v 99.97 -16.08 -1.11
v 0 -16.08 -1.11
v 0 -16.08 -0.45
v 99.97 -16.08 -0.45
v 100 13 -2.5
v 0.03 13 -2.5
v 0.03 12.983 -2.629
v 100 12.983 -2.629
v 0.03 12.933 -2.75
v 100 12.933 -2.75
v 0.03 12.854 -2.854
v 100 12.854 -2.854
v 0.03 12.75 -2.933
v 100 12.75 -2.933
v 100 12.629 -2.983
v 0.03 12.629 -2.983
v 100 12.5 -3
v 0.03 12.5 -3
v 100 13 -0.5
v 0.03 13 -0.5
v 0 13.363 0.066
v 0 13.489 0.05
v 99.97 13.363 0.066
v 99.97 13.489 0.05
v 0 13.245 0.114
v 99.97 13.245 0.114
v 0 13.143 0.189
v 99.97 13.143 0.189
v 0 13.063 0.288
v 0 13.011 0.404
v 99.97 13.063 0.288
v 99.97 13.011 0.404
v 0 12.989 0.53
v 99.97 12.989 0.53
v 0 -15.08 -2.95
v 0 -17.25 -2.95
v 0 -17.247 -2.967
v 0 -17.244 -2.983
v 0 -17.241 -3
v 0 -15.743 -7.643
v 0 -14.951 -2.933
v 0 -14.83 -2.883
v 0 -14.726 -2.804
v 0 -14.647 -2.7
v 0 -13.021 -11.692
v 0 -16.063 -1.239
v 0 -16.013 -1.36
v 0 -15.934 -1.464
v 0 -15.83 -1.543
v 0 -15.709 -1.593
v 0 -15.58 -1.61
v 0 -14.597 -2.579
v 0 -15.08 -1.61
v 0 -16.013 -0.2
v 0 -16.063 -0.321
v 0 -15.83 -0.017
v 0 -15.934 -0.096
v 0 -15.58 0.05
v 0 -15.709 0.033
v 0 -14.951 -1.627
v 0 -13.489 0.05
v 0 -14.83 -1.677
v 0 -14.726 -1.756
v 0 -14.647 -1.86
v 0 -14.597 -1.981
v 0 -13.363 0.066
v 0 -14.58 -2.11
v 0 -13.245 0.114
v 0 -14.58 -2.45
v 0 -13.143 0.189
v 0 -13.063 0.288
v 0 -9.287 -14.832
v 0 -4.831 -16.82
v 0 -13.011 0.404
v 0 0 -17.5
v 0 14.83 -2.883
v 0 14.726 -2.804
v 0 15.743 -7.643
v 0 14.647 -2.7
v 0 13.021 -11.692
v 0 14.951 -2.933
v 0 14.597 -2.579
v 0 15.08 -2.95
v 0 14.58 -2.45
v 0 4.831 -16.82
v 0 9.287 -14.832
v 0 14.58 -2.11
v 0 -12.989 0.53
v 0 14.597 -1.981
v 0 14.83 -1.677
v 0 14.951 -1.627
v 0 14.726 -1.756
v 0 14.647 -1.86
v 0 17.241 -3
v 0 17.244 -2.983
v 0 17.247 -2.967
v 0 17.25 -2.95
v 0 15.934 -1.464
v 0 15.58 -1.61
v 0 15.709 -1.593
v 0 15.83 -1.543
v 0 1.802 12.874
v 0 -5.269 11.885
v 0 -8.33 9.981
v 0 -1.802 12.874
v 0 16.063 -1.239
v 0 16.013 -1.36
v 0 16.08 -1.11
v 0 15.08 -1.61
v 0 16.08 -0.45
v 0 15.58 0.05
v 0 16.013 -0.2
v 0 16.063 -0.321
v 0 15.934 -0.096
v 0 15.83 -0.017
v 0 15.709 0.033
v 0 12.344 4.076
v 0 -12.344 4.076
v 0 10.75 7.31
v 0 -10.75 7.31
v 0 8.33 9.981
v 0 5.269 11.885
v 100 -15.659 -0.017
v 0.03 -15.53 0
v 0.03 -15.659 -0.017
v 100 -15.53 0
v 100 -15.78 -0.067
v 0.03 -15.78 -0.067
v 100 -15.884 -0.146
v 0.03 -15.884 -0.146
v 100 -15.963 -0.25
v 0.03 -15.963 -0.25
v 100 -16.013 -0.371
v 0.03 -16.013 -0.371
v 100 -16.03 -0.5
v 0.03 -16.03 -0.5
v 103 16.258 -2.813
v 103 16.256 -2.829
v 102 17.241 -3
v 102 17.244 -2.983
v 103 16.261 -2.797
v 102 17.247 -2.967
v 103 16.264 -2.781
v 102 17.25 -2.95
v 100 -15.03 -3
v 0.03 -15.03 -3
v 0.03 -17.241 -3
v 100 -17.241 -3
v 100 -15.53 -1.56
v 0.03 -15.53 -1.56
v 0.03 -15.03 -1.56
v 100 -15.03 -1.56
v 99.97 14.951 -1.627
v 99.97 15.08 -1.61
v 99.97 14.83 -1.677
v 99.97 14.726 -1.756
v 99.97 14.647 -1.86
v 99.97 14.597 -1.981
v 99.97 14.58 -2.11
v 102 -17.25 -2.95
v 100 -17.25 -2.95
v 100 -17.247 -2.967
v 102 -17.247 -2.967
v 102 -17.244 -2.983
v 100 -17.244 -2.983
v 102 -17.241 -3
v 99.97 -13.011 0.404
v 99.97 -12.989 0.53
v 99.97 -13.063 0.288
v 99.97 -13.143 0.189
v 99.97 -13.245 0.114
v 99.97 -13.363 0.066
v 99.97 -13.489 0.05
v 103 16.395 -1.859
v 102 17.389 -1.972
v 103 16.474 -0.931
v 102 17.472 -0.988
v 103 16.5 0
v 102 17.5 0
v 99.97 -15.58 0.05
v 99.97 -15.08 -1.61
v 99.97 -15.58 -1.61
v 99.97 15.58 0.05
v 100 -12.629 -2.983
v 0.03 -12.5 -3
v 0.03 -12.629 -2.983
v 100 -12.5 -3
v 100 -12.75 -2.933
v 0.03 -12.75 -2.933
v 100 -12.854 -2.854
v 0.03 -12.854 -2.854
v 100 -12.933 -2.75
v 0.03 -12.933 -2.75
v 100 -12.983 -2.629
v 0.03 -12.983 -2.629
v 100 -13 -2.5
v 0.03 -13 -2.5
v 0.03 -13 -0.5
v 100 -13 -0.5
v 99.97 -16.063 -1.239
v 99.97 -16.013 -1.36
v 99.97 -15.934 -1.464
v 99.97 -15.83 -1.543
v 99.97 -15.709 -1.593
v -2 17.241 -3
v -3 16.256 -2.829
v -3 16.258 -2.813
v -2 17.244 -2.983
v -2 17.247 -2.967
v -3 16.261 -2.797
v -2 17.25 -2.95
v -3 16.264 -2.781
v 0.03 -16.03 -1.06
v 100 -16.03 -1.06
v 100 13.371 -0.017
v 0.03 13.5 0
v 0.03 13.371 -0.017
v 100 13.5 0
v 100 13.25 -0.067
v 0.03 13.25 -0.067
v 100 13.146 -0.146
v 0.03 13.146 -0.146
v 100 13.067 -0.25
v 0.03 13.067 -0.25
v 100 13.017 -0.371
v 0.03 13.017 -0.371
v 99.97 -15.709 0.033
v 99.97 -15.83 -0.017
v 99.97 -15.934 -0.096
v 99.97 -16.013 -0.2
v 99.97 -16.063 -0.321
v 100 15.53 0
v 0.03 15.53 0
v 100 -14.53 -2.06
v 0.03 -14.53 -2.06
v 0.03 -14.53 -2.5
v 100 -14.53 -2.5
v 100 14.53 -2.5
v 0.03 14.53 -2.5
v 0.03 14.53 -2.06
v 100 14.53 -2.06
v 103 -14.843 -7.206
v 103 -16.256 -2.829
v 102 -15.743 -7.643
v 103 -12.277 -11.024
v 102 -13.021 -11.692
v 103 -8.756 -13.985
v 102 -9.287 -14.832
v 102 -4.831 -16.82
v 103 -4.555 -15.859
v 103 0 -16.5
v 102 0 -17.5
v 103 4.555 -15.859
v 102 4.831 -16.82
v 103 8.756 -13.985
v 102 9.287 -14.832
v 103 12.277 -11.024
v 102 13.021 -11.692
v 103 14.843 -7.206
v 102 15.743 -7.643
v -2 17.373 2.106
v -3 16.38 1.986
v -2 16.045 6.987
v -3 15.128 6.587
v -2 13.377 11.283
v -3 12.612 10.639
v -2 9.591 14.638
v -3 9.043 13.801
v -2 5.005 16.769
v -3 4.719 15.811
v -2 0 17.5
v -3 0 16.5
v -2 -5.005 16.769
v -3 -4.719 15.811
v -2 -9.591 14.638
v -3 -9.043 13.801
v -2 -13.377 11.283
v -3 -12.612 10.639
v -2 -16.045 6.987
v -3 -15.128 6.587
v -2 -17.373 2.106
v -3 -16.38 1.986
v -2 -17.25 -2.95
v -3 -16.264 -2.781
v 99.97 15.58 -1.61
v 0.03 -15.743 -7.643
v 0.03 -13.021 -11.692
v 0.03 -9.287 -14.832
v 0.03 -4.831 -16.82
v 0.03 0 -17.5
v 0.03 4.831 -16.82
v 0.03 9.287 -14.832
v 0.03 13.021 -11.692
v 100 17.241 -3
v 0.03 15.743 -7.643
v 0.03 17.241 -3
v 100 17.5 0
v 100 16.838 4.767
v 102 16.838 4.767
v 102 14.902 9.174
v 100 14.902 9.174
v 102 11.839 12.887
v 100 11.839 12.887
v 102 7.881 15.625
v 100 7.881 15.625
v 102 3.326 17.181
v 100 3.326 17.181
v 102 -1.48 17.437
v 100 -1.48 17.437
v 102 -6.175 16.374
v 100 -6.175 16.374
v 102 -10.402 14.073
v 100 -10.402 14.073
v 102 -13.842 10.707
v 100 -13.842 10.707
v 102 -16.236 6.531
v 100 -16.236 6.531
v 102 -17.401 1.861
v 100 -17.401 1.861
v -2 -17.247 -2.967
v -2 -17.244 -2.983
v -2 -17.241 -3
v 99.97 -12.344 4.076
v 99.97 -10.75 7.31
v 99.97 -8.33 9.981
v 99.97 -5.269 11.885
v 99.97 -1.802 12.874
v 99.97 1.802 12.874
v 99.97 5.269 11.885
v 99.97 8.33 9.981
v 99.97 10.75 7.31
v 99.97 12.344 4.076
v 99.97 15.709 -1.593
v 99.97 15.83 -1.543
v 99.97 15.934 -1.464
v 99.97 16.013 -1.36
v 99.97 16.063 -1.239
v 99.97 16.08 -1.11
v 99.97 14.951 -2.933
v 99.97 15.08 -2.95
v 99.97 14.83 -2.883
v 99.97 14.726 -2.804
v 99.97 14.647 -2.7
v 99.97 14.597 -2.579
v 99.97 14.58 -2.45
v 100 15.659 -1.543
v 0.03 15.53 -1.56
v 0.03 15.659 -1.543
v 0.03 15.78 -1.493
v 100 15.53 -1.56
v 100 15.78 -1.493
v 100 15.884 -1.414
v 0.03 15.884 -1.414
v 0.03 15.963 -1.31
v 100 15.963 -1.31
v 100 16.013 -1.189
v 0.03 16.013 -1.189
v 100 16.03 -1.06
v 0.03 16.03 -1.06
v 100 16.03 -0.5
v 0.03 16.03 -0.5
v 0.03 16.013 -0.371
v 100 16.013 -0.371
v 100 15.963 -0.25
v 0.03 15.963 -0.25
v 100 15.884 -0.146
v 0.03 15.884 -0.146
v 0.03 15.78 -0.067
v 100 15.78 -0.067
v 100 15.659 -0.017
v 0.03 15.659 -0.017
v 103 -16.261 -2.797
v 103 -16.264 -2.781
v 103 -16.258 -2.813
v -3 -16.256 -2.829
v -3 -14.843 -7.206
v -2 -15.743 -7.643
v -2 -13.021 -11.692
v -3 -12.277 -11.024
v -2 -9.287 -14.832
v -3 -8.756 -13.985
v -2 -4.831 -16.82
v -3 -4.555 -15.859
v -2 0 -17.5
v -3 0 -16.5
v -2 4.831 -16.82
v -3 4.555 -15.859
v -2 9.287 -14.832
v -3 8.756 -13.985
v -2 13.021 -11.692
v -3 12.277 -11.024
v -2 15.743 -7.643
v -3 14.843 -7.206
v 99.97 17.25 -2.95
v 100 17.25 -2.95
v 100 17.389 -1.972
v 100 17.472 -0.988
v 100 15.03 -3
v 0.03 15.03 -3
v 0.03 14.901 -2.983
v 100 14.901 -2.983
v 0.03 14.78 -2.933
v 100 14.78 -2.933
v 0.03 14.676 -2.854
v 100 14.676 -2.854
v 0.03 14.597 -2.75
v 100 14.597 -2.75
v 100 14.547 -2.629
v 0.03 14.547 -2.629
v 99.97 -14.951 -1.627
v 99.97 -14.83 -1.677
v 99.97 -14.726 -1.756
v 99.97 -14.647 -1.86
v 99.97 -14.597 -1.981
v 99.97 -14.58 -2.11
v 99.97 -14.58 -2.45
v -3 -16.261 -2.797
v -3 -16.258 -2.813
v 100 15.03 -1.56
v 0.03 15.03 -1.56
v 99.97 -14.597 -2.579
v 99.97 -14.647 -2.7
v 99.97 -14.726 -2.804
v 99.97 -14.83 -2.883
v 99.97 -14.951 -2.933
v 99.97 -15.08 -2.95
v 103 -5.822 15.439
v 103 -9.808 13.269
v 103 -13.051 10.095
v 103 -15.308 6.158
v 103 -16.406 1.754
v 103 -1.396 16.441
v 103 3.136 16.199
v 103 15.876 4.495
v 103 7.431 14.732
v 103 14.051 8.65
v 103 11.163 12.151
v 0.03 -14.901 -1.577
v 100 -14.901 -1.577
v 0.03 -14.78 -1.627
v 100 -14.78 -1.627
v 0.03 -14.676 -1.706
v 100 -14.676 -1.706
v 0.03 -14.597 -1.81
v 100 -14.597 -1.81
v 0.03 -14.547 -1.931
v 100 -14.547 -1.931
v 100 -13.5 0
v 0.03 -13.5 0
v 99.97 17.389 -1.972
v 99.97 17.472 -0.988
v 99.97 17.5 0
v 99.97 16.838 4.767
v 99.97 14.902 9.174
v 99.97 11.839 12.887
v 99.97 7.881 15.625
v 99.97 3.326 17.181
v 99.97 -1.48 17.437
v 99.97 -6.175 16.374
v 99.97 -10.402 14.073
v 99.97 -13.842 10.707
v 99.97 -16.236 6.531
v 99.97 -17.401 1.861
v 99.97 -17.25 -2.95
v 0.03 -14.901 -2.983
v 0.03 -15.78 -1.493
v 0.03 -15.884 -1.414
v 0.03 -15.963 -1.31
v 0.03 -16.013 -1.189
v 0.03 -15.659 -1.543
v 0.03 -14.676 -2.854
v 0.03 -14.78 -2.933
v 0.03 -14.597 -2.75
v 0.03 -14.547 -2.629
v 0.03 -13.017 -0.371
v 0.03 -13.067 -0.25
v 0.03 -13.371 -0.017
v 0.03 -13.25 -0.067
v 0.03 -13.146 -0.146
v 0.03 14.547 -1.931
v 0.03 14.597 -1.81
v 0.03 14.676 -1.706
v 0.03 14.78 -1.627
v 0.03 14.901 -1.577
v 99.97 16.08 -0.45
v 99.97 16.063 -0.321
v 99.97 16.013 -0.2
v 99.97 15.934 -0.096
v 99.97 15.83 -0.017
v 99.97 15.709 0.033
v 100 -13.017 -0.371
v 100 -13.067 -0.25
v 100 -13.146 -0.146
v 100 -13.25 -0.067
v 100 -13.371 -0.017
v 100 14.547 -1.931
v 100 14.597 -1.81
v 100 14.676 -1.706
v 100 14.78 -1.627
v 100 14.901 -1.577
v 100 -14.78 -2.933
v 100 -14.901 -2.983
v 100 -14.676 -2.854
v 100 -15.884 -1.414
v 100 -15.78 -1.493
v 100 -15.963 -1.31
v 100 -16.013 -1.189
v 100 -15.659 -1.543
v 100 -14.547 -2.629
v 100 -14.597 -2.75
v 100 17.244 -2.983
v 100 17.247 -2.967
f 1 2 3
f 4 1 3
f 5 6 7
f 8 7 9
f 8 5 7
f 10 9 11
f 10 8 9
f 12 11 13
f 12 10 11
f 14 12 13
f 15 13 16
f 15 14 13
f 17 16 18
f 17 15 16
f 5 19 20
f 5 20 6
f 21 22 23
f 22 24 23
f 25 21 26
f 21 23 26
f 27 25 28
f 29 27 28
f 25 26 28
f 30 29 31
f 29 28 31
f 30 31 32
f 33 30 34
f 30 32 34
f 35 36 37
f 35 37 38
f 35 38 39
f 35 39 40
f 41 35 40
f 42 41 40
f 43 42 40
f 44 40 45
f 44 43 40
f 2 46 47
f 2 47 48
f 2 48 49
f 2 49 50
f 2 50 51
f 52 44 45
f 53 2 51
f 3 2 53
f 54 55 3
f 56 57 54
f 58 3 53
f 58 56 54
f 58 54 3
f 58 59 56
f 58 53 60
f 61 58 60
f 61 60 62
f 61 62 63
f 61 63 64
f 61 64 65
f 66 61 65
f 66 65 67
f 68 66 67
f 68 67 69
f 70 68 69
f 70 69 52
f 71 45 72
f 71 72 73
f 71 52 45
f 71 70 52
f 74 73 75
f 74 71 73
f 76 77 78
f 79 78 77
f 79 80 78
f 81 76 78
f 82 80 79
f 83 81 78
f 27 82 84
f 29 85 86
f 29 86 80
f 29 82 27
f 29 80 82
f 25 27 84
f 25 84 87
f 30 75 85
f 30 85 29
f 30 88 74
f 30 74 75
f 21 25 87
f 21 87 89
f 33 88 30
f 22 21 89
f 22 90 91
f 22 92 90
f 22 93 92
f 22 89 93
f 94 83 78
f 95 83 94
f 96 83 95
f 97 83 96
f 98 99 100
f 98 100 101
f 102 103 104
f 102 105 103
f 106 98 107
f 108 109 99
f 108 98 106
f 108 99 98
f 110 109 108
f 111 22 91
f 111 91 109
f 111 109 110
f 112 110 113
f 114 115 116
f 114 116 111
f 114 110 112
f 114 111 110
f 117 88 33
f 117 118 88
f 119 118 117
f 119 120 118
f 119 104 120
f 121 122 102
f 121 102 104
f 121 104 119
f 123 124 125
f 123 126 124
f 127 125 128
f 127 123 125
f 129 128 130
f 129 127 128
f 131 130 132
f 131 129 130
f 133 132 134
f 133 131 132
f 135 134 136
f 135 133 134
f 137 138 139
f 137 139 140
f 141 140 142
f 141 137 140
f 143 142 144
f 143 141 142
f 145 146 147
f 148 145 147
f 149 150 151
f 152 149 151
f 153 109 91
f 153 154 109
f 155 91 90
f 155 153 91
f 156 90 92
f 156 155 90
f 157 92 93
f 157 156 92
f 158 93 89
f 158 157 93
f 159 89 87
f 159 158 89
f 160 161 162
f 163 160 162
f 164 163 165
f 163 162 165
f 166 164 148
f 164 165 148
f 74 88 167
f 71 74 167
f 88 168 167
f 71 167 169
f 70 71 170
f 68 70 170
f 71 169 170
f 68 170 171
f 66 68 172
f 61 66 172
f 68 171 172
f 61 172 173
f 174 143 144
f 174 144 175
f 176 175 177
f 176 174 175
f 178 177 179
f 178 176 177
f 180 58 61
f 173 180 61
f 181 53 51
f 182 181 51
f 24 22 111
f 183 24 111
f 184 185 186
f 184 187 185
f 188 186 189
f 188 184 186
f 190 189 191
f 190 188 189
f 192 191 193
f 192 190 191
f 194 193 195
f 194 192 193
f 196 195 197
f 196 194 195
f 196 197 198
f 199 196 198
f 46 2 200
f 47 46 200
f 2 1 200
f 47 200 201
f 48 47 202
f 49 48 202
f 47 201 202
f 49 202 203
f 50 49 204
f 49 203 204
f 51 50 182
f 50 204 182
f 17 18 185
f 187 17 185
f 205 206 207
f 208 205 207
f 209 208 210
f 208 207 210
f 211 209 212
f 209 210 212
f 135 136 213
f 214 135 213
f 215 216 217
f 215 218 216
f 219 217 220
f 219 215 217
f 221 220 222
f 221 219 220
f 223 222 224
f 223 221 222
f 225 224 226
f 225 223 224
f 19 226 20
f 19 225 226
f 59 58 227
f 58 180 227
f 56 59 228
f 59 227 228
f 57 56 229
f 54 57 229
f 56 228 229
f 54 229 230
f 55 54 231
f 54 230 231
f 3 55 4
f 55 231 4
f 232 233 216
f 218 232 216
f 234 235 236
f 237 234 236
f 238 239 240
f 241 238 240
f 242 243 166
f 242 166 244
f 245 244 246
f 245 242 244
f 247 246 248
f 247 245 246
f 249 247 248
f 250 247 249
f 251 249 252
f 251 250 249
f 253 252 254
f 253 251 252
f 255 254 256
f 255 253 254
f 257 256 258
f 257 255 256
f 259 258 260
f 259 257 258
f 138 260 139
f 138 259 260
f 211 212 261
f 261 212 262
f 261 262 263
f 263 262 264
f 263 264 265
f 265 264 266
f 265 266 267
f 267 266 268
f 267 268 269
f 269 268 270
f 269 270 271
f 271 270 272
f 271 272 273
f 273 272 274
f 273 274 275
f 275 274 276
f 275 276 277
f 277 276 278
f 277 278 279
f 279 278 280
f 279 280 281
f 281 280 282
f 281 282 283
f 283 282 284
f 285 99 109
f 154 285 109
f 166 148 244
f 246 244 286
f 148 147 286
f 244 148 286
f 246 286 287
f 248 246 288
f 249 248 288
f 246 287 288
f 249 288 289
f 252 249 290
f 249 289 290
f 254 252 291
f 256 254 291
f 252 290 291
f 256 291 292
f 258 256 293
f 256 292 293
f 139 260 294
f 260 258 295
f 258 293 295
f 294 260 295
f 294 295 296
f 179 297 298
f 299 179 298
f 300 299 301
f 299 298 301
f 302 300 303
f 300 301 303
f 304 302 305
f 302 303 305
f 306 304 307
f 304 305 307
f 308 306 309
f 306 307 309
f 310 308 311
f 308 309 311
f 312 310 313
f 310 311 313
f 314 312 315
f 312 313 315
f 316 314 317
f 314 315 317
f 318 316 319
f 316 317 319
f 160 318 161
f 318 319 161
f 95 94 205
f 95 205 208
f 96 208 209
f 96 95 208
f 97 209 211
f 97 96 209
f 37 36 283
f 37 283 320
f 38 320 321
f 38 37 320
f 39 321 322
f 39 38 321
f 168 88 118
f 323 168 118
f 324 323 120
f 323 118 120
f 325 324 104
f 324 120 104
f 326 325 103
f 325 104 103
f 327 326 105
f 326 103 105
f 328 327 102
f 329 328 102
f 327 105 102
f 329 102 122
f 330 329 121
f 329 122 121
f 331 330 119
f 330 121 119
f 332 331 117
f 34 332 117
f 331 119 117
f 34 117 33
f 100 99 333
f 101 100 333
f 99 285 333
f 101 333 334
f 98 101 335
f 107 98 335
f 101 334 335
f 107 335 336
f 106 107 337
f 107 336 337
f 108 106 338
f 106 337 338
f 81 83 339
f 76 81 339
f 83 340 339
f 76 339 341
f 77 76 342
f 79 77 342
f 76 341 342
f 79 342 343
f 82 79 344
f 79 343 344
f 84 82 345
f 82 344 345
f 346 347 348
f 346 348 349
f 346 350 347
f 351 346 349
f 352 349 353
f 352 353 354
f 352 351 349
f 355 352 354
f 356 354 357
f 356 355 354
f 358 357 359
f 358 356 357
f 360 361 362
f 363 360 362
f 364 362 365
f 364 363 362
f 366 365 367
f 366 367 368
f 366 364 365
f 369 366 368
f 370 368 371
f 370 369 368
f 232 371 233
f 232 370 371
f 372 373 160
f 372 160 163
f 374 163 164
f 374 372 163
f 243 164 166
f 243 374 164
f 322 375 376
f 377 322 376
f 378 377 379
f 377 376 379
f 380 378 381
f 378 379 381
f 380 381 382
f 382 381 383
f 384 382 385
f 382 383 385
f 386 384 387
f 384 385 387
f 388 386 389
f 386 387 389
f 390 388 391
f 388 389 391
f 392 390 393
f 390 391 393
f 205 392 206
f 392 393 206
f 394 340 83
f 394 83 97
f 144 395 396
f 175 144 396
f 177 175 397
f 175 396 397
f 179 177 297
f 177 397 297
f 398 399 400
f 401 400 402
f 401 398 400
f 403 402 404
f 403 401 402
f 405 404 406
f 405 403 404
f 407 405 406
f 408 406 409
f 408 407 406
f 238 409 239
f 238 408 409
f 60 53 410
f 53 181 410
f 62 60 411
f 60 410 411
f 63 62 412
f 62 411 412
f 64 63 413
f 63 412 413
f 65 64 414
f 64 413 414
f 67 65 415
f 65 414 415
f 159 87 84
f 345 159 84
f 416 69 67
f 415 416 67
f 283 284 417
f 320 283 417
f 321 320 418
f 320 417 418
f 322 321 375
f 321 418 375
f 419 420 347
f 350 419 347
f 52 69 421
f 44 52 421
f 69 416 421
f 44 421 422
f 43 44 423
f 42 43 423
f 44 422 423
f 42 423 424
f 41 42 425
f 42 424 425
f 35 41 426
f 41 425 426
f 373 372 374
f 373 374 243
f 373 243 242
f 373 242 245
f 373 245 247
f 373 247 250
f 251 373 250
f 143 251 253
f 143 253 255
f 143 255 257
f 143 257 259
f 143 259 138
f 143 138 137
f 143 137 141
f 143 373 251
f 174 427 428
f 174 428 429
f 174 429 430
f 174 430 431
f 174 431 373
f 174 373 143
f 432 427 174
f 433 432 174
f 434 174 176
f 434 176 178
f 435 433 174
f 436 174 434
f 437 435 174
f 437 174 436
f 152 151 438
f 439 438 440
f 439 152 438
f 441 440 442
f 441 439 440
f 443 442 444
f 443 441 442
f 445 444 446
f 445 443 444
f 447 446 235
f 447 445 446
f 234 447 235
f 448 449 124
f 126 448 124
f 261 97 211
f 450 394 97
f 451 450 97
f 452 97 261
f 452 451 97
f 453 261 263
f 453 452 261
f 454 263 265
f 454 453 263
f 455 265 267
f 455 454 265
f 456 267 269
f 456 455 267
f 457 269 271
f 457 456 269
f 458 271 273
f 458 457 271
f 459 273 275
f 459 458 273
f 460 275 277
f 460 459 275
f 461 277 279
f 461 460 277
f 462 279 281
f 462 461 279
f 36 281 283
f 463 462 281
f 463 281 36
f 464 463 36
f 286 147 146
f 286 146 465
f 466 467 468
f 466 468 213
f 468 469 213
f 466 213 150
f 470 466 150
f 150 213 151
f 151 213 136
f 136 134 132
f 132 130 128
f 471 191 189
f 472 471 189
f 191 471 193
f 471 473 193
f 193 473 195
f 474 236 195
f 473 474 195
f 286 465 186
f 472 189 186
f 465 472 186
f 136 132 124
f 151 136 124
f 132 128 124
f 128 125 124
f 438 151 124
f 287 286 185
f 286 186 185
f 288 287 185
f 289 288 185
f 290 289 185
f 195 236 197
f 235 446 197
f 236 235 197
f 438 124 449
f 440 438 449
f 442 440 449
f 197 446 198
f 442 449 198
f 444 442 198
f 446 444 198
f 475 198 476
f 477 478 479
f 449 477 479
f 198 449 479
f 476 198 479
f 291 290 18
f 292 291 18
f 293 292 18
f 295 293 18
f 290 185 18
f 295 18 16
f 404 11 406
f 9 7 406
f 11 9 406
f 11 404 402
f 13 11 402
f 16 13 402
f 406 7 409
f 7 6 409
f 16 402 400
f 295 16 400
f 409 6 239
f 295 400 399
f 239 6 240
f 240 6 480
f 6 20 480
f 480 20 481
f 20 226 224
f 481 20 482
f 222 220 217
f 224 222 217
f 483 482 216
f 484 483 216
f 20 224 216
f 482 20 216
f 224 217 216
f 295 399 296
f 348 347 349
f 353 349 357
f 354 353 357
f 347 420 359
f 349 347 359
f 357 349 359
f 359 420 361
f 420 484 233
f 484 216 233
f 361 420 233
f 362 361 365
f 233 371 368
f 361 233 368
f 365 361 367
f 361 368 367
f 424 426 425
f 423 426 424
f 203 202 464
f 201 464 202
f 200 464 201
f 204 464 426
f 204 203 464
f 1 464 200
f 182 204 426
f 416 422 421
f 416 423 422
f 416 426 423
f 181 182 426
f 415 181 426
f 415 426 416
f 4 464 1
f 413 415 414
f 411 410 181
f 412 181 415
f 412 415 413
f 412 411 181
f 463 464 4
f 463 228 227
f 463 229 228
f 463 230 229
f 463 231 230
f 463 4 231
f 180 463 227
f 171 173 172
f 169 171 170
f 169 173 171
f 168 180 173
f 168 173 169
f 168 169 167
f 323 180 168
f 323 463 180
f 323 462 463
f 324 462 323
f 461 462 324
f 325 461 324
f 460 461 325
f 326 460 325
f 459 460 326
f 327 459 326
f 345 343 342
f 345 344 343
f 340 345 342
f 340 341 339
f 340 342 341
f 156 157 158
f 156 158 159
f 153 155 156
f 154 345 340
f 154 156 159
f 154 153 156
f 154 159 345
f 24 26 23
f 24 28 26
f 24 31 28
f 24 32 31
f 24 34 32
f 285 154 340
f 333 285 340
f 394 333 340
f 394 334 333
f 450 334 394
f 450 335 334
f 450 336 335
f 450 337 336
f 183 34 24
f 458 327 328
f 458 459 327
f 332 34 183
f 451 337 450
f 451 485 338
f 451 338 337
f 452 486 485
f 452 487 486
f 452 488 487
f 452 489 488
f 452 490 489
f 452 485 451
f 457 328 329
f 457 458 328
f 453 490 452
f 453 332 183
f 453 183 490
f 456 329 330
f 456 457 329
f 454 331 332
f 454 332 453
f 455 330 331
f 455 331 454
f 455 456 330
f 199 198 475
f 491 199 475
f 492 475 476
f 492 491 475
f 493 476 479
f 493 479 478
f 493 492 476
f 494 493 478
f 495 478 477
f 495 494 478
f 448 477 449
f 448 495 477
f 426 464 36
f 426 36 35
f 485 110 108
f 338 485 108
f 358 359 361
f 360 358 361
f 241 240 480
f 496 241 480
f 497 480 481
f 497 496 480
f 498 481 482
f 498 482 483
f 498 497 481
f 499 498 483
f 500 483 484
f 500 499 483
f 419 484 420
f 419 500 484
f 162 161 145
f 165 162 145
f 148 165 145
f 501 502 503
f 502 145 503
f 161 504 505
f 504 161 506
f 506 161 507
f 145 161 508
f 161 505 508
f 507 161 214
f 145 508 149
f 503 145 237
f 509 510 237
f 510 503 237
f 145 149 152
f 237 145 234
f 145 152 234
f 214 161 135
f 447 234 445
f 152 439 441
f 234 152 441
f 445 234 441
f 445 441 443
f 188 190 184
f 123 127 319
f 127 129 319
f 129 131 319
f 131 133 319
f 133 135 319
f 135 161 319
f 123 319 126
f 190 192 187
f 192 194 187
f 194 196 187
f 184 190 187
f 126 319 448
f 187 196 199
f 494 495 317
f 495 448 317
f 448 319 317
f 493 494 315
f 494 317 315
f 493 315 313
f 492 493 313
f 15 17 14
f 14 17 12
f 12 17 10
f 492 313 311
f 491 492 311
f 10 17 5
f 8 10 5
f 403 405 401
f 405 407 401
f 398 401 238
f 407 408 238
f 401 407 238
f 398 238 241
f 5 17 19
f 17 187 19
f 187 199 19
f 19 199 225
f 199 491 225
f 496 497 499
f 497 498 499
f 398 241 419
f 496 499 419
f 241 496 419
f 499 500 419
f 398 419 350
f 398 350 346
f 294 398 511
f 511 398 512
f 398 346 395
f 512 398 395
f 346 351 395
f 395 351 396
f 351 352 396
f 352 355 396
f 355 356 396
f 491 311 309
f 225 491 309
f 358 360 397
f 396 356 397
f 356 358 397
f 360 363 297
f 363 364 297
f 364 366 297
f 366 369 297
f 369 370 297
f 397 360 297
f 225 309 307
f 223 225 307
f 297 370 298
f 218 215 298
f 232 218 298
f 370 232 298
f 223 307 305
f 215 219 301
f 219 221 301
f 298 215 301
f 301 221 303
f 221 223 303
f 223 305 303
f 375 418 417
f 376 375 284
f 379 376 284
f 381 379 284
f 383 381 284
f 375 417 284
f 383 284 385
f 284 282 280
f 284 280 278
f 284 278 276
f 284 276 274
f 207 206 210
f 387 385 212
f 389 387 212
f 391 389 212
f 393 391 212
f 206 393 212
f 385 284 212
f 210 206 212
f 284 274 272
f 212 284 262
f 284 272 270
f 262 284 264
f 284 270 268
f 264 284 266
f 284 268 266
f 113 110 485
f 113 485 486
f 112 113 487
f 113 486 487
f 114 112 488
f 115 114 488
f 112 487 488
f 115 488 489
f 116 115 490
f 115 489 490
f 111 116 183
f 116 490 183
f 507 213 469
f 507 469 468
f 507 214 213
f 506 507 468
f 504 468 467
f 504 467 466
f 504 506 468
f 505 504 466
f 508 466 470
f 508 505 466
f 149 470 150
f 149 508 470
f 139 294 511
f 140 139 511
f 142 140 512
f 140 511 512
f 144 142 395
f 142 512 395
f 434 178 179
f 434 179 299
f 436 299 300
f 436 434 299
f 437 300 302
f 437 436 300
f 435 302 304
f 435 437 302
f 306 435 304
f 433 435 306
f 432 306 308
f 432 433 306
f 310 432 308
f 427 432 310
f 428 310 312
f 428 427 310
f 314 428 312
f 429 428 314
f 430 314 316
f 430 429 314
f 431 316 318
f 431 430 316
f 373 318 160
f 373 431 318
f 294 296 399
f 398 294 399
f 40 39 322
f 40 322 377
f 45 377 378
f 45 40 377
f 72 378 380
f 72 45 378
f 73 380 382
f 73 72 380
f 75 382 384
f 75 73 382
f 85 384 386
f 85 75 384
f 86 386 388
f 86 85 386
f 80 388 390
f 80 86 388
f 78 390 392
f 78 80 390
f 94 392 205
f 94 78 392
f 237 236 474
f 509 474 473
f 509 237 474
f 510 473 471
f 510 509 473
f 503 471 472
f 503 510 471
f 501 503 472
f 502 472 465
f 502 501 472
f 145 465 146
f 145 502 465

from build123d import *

# Parameters (mm, degrees)
F1_DEPTH  = 99.97
F2_DEPTH  = 3
F3_START  = 0.03
F3_DEPTH  = 99.97
F4_START  = 100
F4_DEPTH  = 3
F5_SIZE   = 1
F5_2_SIZE = 1
F6_R      = 0.5
F6_2_R    = 0.5


with BuildPart() as f1:
    # F0 (on Right) → F1 (new body)
    with BuildSketch(Plane.YZ):
        with BuildLine():
            ThreePointArc((17.2495652119, -2.95), (17.4372789048, -1.4803055076), (17.5, 0))
            ThreePointArc((17.5, 0), (-1.4803055076, 17.4372789048), (-17.2495652119, -2.95))
            Line((-17.2495652119, -2.95), (-14.5799998846, -2.95))
            Line((-14.5799998846, -2.95), (-14.5799998846, -1.6099997692))
            Line((-14.5799998846, -1.6099997692), (-16.0799998846, -1.6099997692))
            Line((-16.0799998846, -1.6099997692), (-16.0799998846, 0.05))
            Line((-16.0799998846, 0.05), (-12.9999038458, 0.05))
            ThreePointArc((-12.9999038458, 0.05), (0, 13), (12.9999038458, 0.05))
            Line((12.9999038458, 0.05), (16.0799998846, 0.05))
            Line((16.0799998846, 0.05), (16.0799998846, -1.6099997692))
            Line((16.0799998846, -1.6099997692), (14.5799998846, -1.6099997692))
            Line((14.5799998846, -1.6099997692), (14.5799998846, -2.95))
            Line((14.5799998846, -2.95), (17.2495652119, -2.95))
        make_face()
    extrude(amount=F1_DEPTH)

    # F0 (on Right) → F2 (join)
    with BuildSketch(Plane.YZ):
        with BuildLine():
            ThreePointArc((17.2495652119, -2.95), (17.4372789048, -1.4803055076), (17.5, 0))
            ThreePointArc((17.5, 0), (-1.4803055076, 17.4372789048), (-17.2495652119, -2.95))
            Line((-17.2495652119, -2.95), (-14.5799998846, -2.95))
            Line((-14.5799998846, -2.95), (-14.5799998846, -1.6099997692))
            Line((-14.5799998846, -1.6099997692), (-16.0799998846, -1.6099997692))
            Line((-16.0799998846, -1.6099997692), (-16.0799998846, 0.05))
            Line((-16.0799998846, 0.05), (-12.9999038458, 0.05))
            ThreePointArc((-12.9999038458, 0.05), (0, 13), (12.9999038458, 0.05))
            Line((12.9999038458, 0.05), (16.0799998846, 0.05))
            Line((16.0799998846, 0.05), (16.0799998846, -1.6099997692))
            Line((16.0799998846, -1.6099997692), (14.5799998846, -1.6099997692))
            Line((14.5799998846, -1.6099997692), (14.5799998846, -2.95))
            Line((14.5799998846, -2.95), (17.2495652119, -2.95))
        make_face()
        with BuildLine():
            Line((-14.5799998846, -2.95), (-17.2495652119, -2.95))
            ThreePointArc((-17.2495652119, -2.95), (-17.2452705517, -2.9750031261), (-17.2409396496, -3))
            Line((-17.2409396496, -3), (-14.5299998846, -3))
            Line((-14.5299998846, -3), (-14.5299998846, -1.5599997692))
            Line((-14.5299998846, -1.5599997692), (-16.0299998846, -1.5599997692))
            Line((-16.0299998846, -1.5599997692), (-16.0299998846, 0))
            Line((-16.0299998846, 0), (-13, 0))
            ThreePointArc((-13, 0), (-12.9999759614, 0.0250000462), (-12.9999038458, 0.05))
            Line((-12.9999038458, 0.05), (-16.0799998846, 0.05))
            Line((-16.0799998846, 0.05), (-16.0799998846, -1.6099997692))
            Line((-16.0799998846, -1.6099997692), (-14.5799998846, -1.6099997692))
            Line((-14.5799998846, -1.6099997692), (-14.5799998846, -2.95))
        make_face()
        with BuildLine():
            ThreePointArc((17.2409396496, -3), (17.2452705517, -2.9750031261), (17.2495652119, -2.95))
            Line((17.2495652119, -2.95), (14.5799998846, -2.95))
            Line((14.5799998846, -2.95), (14.5799998846, -1.6099997692))
            Line((14.5799998846, -1.6099997692), (16.0799998846, -1.6099997692))
            Line((16.0799998846, -1.6099997692), (16.0799998846, 0.05))
            Line((16.0799998846, 0.05), (12.9999038458, 0.05))
            ThreePointArc((12.9999038458, 0.05), (12.9999759614, 0.0250000462), (13, 0))
            Line((13, 0), (16.0299998846, 0))
            Line((16.0299998846, 0), (16.0299998846, -1.5599997692))
            Line((16.0299998846, -1.5599997692), (14.5299998846, -1.5599997692))
            Line((14.5299998846, -1.5599997692), (14.5299998846, -3))
            Line((14.5299998846, -3), (17.2409396496, -3))
        make_face()
        with BuildLine():
            Line((-14.5299998846, -3), (-17.2409396496, -3))
            ThreePointArc((-17.2409396496, -3), (0, -17.5), (17.2409396496, -3))
            Line((17.2409396496, -3), (14.5299998846, -3))
            Line((14.5299998846, -3), (14.5299998846, -1.5599997692))
            Line((14.5299998846, -1.5599997692), (16.0299998846, -1.5599997692))
            Line((16.0299998846, -1.5599997692), (16.0299998846, 0))
            Line((16.0299998846, 0), (13, 0))
            Line((13, 0), (13, -3))
            Line((13, -3), (-13, -3))
            Line((-13, -3), (-13, 0))
            Line((-13, 0), (-16.0299998846, 0))
            Line((-16.0299998846, 0), (-16.0299998846, -1.5599997692))
            Line((-16.0299998846, -1.5599997692), (-14.5299998846, -1.5599997692))
            Line((-14.5299998846, -1.5599997692), (-14.5299998846, -3))
        make_face()
        with BuildLine():
            ThreePointArc((12.9999038458, 0.05), (0, 13), (-12.9999038458, 0.05))
            Line((-12.9999038458, 0.05), (12.9999038458, 0.05))
        make_face()
        with BuildLine():
            Line((12.9999038458, 0.05), (-12.9999038458, 0.05))
            ThreePointArc((-12.9999038458, 0.05), (-12.9999759614, 0.0250000462), (-13, 0))
            Line((-13, 0), (-13, -3))
            Line((-13, -3), (13, -3))
            Line((13, -3), (13, 0))
            ThreePointArc((13, 0), (12.9999759614, 0.0250000462), (12.9999038458, 0.05))
        make_face()
    extrude(amount=-F2_DEPTH)

    # F5
    f5_edges = [f1.edges().sort_by_distance(p)[0] for p in [
        (-3, 17.24094, 3),
    ]]
    chamfer(f5_edges, length=F5_SIZE)

    # F6#2
    f6_2_edges = [f1.edges().sort_by_distance(p)[0] for p in [
        (49.985, 16.08, 0.05),
        (49.985, 16.08, -1.61),
        (49.985, 14.58, -1.61),
        (49.985, 14.58, -2.95),
        (49.985, -14.58, -1.61),
        (49.985, -14.58, -2.95),
        (49.985, -16.08, -1.61),
        (49.985, -16.08, 0.05),
        (49.985, -12.999904, 0.05),
        (49.985, 12.999904, 0.05),
    ]]
    fillet(f6_2_edges, radius=F6_2_R)


with BuildPart() as f3:
    # F0 (on Right) → F3 (new body)
    with BuildSketch(Plane.YZ.offset(F3_START)):
        with BuildLine():
            Line((-14.5299998846, -3), (-17.2409396496, -3))
            ThreePointArc((-17.2409396496, -3), (0, -17.5), (17.2409396496, -3))
            Line((17.2409396496, -3), (14.5299998846, -3))
            Line((14.5299998846, -3), (14.5299998846, -1.5599997692))
            Line((14.5299998846, -1.5599997692), (16.0299998846, -1.5599997692))
            Line((16.0299998846, -1.5599997692), (16.0299998846, 0))
            Line((16.0299998846, 0), (13, 0))
            Line((13, 0), (13, -3))
            Line((13, -3), (-13, -3))
            Line((-13, -3), (-13, 0))
            Line((-13, 0), (-16.0299998846, 0))
            Line((-16.0299998846, 0), (-16.0299998846, -1.5599997692))
            Line((-16.0299998846, -1.5599997692), (-14.5299998846, -1.5599997692))
            Line((-14.5299998846, -1.5599997692), (-14.5299998846, -3))
        make_face()
    extrude(amount=F3_DEPTH)

    # F0 (on Right) → F4 (join)
    with BuildSketch(Plane.YZ.offset(F4_START)):
        with BuildLine():
            ThreePointArc((17.2495652119, -2.95), (17.4372789048, -1.4803055076), (17.5, 0))
            ThreePointArc((17.5, 0), (-1.4803055076, 17.4372789048), (-17.2495652119, -2.95))
            Line((-17.2495652119, -2.95), (-14.5799998846, -2.95))
            Line((-14.5799998846, -2.95), (-14.5799998846, -1.6099997692))
            Line((-14.5799998846, -1.6099997692), (-16.0799998846, -1.6099997692))
            Line((-16.0799998846, -1.6099997692), (-16.0799998846, 0.05))
            Line((-16.0799998846, 0.05), (-12.9999038458, 0.05))
            ThreePointArc((-12.9999038458, 0.05), (0, 13), (12.9999038458, 0.05))
            Line((12.9999038458, 0.05), (16.0799998846, 0.05))
            Line((16.0799998846, 0.05), (16.0799998846, -1.6099997692))
            Line((16.0799998846, -1.6099997692), (14.5799998846, -1.6099997692))
            Line((14.5799998846, -1.6099997692), (14.5799998846, -2.95))
            Line((14.5799998846, -2.95), (17.2495652119, -2.95))
        make_face()
        with BuildLine():
            Line((-14.5799998846, -2.95), (-17.2495652119, -2.95))
            ThreePointArc((-17.2495652119, -2.95), (-17.2452705517, -2.9750031261), (-17.2409396496, -3))
            Line((-17.2409396496, -3), (-14.5299998846, -3))
            Line((-14.5299998846, -3), (-14.5299998846, -1.5599997692))
            Line((-14.5299998846, -1.5599997692), (-16.0299998846, -1.5599997692))
            Line((-16.0299998846, -1.5599997692), (-16.0299998846, 0))
            Line((-16.0299998846, 0), (-13, 0))
            ThreePointArc((-13, 0), (-12.9999759614, 0.0250000462), (-12.9999038458, 0.05))
            Line((-12.9999038458, 0.05), (-16.0799998846, 0.05))
            Line((-16.0799998846, 0.05), (-16.0799998846, -1.6099997692))
            Line((-16.0799998846, -1.6099997692), (-14.5799998846, -1.6099997692))
            Line((-14.5799998846, -1.6099997692), (-14.5799998846, -2.95))
        make_face()
        with BuildLine():
            ThreePointArc((17.2409396496, -3), (17.2452705517, -2.9750031261), (17.2495652119, -2.95))
            Line((17.2495652119, -2.95), (14.5799998846, -2.95))
            Line((14.5799998846, -2.95), (14.5799998846, -1.6099997692))
            Line((14.5799998846, -1.6099997692), (16.0799998846, -1.6099997692))
            Line((16.0799998846, -1.6099997692), (16.0799998846, 0.05))
            Line((16.0799998846, 0.05), (12.9999038458, 0.05))
            ThreePointArc((12.9999038458, 0.05), (12.9999759614, 0.0250000462), (13, 0))
            Line((13, 0), (16.0299998846, 0))
            Line((16.0299998846, 0), (16.0299998846, -1.5599997692))
            Line((16.0299998846, -1.5599997692), (14.5299998846, -1.5599997692))
            Line((14.5299998846, -1.5599997692), (14.5299998846, -3))
            Line((14.5299998846, -3), (17.2409396496, -3))
        make_face()
        with BuildLine():
            Line((-14.5299998846, -3), (-17.2409396496, -3))
            ThreePointArc((-17.2409396496, -3), (0, -17.5), (17.2409396496, -3))
            Line((17.2409396496, -3), (14.5299998846, -3))
            Line((14.5299998846, -3), (14.5299998846, -1.5599997692))
            Line((14.5299998846, -1.5599997692), (16.0299998846, -1.5599997692))
            Line((16.0299998846, -1.5599997692), (16.0299998846, 0))
            Line((16.0299998846, 0), (13, 0))
            Line((13, 0), (13, -3))
            Line((13, -3), (-13, -3))
            Line((-13, -3), (-13, 0))
            Line((-13, 0), (-16.0299998846, 0))
            Line((-16.0299998846, 0), (-16.0299998846, -1.5599997692))
            Line((-16.0299998846, -1.5599997692), (-14.5299998846, -1.5599997692))
            Line((-14.5299998846, -1.5599997692), (-14.5299998846, -3))
        make_face()
        with BuildLine():
            ThreePointArc((12.9999038458, 0.05), (0, 13), (-12.9999038458, 0.05))
            Line((-12.9999038458, 0.05), (12.9999038458, 0.05))
        make_face()
        with BuildLine():
            Line((12.9999038458, 0.05), (-12.9999038458, 0.05))
            ThreePointArc((-12.9999038458, 0.05), (-12.9999759614, 0.0250000462), (-13, 0))
            Line((-13, 0), (-13, -3))
            Line((-13, -3), (13, -3))
            Line((13, -3), (13, 0))
            ThreePointArc((13, 0), (12.9999759614, 0.0250000462), (12.9999038458, 0.05))
        make_face()
    extrude(amount=F4_DEPTH)

    # F5#2
    f5_2_edges = [f3.edges().sort_by_distance(p)[0] for p in [
        (103, 17.24094, 3),
    ]]
    chamfer(f5_2_edges, length=F5_2_SIZE)

    # F6
    f6_edges = [f3.edges().sort_by_distance(p)[0] for p in [
        (50.015, 13, 0),
        (50.015, 16.03, 0),
        (50.015, 16.03, -1.56),
        (50.015, 14.53, -1.56),
        (50.015, 13, -3),
        (50.015, 14.53, -3),
        (50.015, -13, 0),
        (50.015, -13, -3),
        (50.015, -14.53, -1.56),
        (50.015, -14.53, -3),
        (50.015, -16.03, -1.56),
        (50.015, -16.03, 0),
    ]]
    fillet(f6_edges, radius=F6_R)


solid = Compound([f1.part, f3.part])
